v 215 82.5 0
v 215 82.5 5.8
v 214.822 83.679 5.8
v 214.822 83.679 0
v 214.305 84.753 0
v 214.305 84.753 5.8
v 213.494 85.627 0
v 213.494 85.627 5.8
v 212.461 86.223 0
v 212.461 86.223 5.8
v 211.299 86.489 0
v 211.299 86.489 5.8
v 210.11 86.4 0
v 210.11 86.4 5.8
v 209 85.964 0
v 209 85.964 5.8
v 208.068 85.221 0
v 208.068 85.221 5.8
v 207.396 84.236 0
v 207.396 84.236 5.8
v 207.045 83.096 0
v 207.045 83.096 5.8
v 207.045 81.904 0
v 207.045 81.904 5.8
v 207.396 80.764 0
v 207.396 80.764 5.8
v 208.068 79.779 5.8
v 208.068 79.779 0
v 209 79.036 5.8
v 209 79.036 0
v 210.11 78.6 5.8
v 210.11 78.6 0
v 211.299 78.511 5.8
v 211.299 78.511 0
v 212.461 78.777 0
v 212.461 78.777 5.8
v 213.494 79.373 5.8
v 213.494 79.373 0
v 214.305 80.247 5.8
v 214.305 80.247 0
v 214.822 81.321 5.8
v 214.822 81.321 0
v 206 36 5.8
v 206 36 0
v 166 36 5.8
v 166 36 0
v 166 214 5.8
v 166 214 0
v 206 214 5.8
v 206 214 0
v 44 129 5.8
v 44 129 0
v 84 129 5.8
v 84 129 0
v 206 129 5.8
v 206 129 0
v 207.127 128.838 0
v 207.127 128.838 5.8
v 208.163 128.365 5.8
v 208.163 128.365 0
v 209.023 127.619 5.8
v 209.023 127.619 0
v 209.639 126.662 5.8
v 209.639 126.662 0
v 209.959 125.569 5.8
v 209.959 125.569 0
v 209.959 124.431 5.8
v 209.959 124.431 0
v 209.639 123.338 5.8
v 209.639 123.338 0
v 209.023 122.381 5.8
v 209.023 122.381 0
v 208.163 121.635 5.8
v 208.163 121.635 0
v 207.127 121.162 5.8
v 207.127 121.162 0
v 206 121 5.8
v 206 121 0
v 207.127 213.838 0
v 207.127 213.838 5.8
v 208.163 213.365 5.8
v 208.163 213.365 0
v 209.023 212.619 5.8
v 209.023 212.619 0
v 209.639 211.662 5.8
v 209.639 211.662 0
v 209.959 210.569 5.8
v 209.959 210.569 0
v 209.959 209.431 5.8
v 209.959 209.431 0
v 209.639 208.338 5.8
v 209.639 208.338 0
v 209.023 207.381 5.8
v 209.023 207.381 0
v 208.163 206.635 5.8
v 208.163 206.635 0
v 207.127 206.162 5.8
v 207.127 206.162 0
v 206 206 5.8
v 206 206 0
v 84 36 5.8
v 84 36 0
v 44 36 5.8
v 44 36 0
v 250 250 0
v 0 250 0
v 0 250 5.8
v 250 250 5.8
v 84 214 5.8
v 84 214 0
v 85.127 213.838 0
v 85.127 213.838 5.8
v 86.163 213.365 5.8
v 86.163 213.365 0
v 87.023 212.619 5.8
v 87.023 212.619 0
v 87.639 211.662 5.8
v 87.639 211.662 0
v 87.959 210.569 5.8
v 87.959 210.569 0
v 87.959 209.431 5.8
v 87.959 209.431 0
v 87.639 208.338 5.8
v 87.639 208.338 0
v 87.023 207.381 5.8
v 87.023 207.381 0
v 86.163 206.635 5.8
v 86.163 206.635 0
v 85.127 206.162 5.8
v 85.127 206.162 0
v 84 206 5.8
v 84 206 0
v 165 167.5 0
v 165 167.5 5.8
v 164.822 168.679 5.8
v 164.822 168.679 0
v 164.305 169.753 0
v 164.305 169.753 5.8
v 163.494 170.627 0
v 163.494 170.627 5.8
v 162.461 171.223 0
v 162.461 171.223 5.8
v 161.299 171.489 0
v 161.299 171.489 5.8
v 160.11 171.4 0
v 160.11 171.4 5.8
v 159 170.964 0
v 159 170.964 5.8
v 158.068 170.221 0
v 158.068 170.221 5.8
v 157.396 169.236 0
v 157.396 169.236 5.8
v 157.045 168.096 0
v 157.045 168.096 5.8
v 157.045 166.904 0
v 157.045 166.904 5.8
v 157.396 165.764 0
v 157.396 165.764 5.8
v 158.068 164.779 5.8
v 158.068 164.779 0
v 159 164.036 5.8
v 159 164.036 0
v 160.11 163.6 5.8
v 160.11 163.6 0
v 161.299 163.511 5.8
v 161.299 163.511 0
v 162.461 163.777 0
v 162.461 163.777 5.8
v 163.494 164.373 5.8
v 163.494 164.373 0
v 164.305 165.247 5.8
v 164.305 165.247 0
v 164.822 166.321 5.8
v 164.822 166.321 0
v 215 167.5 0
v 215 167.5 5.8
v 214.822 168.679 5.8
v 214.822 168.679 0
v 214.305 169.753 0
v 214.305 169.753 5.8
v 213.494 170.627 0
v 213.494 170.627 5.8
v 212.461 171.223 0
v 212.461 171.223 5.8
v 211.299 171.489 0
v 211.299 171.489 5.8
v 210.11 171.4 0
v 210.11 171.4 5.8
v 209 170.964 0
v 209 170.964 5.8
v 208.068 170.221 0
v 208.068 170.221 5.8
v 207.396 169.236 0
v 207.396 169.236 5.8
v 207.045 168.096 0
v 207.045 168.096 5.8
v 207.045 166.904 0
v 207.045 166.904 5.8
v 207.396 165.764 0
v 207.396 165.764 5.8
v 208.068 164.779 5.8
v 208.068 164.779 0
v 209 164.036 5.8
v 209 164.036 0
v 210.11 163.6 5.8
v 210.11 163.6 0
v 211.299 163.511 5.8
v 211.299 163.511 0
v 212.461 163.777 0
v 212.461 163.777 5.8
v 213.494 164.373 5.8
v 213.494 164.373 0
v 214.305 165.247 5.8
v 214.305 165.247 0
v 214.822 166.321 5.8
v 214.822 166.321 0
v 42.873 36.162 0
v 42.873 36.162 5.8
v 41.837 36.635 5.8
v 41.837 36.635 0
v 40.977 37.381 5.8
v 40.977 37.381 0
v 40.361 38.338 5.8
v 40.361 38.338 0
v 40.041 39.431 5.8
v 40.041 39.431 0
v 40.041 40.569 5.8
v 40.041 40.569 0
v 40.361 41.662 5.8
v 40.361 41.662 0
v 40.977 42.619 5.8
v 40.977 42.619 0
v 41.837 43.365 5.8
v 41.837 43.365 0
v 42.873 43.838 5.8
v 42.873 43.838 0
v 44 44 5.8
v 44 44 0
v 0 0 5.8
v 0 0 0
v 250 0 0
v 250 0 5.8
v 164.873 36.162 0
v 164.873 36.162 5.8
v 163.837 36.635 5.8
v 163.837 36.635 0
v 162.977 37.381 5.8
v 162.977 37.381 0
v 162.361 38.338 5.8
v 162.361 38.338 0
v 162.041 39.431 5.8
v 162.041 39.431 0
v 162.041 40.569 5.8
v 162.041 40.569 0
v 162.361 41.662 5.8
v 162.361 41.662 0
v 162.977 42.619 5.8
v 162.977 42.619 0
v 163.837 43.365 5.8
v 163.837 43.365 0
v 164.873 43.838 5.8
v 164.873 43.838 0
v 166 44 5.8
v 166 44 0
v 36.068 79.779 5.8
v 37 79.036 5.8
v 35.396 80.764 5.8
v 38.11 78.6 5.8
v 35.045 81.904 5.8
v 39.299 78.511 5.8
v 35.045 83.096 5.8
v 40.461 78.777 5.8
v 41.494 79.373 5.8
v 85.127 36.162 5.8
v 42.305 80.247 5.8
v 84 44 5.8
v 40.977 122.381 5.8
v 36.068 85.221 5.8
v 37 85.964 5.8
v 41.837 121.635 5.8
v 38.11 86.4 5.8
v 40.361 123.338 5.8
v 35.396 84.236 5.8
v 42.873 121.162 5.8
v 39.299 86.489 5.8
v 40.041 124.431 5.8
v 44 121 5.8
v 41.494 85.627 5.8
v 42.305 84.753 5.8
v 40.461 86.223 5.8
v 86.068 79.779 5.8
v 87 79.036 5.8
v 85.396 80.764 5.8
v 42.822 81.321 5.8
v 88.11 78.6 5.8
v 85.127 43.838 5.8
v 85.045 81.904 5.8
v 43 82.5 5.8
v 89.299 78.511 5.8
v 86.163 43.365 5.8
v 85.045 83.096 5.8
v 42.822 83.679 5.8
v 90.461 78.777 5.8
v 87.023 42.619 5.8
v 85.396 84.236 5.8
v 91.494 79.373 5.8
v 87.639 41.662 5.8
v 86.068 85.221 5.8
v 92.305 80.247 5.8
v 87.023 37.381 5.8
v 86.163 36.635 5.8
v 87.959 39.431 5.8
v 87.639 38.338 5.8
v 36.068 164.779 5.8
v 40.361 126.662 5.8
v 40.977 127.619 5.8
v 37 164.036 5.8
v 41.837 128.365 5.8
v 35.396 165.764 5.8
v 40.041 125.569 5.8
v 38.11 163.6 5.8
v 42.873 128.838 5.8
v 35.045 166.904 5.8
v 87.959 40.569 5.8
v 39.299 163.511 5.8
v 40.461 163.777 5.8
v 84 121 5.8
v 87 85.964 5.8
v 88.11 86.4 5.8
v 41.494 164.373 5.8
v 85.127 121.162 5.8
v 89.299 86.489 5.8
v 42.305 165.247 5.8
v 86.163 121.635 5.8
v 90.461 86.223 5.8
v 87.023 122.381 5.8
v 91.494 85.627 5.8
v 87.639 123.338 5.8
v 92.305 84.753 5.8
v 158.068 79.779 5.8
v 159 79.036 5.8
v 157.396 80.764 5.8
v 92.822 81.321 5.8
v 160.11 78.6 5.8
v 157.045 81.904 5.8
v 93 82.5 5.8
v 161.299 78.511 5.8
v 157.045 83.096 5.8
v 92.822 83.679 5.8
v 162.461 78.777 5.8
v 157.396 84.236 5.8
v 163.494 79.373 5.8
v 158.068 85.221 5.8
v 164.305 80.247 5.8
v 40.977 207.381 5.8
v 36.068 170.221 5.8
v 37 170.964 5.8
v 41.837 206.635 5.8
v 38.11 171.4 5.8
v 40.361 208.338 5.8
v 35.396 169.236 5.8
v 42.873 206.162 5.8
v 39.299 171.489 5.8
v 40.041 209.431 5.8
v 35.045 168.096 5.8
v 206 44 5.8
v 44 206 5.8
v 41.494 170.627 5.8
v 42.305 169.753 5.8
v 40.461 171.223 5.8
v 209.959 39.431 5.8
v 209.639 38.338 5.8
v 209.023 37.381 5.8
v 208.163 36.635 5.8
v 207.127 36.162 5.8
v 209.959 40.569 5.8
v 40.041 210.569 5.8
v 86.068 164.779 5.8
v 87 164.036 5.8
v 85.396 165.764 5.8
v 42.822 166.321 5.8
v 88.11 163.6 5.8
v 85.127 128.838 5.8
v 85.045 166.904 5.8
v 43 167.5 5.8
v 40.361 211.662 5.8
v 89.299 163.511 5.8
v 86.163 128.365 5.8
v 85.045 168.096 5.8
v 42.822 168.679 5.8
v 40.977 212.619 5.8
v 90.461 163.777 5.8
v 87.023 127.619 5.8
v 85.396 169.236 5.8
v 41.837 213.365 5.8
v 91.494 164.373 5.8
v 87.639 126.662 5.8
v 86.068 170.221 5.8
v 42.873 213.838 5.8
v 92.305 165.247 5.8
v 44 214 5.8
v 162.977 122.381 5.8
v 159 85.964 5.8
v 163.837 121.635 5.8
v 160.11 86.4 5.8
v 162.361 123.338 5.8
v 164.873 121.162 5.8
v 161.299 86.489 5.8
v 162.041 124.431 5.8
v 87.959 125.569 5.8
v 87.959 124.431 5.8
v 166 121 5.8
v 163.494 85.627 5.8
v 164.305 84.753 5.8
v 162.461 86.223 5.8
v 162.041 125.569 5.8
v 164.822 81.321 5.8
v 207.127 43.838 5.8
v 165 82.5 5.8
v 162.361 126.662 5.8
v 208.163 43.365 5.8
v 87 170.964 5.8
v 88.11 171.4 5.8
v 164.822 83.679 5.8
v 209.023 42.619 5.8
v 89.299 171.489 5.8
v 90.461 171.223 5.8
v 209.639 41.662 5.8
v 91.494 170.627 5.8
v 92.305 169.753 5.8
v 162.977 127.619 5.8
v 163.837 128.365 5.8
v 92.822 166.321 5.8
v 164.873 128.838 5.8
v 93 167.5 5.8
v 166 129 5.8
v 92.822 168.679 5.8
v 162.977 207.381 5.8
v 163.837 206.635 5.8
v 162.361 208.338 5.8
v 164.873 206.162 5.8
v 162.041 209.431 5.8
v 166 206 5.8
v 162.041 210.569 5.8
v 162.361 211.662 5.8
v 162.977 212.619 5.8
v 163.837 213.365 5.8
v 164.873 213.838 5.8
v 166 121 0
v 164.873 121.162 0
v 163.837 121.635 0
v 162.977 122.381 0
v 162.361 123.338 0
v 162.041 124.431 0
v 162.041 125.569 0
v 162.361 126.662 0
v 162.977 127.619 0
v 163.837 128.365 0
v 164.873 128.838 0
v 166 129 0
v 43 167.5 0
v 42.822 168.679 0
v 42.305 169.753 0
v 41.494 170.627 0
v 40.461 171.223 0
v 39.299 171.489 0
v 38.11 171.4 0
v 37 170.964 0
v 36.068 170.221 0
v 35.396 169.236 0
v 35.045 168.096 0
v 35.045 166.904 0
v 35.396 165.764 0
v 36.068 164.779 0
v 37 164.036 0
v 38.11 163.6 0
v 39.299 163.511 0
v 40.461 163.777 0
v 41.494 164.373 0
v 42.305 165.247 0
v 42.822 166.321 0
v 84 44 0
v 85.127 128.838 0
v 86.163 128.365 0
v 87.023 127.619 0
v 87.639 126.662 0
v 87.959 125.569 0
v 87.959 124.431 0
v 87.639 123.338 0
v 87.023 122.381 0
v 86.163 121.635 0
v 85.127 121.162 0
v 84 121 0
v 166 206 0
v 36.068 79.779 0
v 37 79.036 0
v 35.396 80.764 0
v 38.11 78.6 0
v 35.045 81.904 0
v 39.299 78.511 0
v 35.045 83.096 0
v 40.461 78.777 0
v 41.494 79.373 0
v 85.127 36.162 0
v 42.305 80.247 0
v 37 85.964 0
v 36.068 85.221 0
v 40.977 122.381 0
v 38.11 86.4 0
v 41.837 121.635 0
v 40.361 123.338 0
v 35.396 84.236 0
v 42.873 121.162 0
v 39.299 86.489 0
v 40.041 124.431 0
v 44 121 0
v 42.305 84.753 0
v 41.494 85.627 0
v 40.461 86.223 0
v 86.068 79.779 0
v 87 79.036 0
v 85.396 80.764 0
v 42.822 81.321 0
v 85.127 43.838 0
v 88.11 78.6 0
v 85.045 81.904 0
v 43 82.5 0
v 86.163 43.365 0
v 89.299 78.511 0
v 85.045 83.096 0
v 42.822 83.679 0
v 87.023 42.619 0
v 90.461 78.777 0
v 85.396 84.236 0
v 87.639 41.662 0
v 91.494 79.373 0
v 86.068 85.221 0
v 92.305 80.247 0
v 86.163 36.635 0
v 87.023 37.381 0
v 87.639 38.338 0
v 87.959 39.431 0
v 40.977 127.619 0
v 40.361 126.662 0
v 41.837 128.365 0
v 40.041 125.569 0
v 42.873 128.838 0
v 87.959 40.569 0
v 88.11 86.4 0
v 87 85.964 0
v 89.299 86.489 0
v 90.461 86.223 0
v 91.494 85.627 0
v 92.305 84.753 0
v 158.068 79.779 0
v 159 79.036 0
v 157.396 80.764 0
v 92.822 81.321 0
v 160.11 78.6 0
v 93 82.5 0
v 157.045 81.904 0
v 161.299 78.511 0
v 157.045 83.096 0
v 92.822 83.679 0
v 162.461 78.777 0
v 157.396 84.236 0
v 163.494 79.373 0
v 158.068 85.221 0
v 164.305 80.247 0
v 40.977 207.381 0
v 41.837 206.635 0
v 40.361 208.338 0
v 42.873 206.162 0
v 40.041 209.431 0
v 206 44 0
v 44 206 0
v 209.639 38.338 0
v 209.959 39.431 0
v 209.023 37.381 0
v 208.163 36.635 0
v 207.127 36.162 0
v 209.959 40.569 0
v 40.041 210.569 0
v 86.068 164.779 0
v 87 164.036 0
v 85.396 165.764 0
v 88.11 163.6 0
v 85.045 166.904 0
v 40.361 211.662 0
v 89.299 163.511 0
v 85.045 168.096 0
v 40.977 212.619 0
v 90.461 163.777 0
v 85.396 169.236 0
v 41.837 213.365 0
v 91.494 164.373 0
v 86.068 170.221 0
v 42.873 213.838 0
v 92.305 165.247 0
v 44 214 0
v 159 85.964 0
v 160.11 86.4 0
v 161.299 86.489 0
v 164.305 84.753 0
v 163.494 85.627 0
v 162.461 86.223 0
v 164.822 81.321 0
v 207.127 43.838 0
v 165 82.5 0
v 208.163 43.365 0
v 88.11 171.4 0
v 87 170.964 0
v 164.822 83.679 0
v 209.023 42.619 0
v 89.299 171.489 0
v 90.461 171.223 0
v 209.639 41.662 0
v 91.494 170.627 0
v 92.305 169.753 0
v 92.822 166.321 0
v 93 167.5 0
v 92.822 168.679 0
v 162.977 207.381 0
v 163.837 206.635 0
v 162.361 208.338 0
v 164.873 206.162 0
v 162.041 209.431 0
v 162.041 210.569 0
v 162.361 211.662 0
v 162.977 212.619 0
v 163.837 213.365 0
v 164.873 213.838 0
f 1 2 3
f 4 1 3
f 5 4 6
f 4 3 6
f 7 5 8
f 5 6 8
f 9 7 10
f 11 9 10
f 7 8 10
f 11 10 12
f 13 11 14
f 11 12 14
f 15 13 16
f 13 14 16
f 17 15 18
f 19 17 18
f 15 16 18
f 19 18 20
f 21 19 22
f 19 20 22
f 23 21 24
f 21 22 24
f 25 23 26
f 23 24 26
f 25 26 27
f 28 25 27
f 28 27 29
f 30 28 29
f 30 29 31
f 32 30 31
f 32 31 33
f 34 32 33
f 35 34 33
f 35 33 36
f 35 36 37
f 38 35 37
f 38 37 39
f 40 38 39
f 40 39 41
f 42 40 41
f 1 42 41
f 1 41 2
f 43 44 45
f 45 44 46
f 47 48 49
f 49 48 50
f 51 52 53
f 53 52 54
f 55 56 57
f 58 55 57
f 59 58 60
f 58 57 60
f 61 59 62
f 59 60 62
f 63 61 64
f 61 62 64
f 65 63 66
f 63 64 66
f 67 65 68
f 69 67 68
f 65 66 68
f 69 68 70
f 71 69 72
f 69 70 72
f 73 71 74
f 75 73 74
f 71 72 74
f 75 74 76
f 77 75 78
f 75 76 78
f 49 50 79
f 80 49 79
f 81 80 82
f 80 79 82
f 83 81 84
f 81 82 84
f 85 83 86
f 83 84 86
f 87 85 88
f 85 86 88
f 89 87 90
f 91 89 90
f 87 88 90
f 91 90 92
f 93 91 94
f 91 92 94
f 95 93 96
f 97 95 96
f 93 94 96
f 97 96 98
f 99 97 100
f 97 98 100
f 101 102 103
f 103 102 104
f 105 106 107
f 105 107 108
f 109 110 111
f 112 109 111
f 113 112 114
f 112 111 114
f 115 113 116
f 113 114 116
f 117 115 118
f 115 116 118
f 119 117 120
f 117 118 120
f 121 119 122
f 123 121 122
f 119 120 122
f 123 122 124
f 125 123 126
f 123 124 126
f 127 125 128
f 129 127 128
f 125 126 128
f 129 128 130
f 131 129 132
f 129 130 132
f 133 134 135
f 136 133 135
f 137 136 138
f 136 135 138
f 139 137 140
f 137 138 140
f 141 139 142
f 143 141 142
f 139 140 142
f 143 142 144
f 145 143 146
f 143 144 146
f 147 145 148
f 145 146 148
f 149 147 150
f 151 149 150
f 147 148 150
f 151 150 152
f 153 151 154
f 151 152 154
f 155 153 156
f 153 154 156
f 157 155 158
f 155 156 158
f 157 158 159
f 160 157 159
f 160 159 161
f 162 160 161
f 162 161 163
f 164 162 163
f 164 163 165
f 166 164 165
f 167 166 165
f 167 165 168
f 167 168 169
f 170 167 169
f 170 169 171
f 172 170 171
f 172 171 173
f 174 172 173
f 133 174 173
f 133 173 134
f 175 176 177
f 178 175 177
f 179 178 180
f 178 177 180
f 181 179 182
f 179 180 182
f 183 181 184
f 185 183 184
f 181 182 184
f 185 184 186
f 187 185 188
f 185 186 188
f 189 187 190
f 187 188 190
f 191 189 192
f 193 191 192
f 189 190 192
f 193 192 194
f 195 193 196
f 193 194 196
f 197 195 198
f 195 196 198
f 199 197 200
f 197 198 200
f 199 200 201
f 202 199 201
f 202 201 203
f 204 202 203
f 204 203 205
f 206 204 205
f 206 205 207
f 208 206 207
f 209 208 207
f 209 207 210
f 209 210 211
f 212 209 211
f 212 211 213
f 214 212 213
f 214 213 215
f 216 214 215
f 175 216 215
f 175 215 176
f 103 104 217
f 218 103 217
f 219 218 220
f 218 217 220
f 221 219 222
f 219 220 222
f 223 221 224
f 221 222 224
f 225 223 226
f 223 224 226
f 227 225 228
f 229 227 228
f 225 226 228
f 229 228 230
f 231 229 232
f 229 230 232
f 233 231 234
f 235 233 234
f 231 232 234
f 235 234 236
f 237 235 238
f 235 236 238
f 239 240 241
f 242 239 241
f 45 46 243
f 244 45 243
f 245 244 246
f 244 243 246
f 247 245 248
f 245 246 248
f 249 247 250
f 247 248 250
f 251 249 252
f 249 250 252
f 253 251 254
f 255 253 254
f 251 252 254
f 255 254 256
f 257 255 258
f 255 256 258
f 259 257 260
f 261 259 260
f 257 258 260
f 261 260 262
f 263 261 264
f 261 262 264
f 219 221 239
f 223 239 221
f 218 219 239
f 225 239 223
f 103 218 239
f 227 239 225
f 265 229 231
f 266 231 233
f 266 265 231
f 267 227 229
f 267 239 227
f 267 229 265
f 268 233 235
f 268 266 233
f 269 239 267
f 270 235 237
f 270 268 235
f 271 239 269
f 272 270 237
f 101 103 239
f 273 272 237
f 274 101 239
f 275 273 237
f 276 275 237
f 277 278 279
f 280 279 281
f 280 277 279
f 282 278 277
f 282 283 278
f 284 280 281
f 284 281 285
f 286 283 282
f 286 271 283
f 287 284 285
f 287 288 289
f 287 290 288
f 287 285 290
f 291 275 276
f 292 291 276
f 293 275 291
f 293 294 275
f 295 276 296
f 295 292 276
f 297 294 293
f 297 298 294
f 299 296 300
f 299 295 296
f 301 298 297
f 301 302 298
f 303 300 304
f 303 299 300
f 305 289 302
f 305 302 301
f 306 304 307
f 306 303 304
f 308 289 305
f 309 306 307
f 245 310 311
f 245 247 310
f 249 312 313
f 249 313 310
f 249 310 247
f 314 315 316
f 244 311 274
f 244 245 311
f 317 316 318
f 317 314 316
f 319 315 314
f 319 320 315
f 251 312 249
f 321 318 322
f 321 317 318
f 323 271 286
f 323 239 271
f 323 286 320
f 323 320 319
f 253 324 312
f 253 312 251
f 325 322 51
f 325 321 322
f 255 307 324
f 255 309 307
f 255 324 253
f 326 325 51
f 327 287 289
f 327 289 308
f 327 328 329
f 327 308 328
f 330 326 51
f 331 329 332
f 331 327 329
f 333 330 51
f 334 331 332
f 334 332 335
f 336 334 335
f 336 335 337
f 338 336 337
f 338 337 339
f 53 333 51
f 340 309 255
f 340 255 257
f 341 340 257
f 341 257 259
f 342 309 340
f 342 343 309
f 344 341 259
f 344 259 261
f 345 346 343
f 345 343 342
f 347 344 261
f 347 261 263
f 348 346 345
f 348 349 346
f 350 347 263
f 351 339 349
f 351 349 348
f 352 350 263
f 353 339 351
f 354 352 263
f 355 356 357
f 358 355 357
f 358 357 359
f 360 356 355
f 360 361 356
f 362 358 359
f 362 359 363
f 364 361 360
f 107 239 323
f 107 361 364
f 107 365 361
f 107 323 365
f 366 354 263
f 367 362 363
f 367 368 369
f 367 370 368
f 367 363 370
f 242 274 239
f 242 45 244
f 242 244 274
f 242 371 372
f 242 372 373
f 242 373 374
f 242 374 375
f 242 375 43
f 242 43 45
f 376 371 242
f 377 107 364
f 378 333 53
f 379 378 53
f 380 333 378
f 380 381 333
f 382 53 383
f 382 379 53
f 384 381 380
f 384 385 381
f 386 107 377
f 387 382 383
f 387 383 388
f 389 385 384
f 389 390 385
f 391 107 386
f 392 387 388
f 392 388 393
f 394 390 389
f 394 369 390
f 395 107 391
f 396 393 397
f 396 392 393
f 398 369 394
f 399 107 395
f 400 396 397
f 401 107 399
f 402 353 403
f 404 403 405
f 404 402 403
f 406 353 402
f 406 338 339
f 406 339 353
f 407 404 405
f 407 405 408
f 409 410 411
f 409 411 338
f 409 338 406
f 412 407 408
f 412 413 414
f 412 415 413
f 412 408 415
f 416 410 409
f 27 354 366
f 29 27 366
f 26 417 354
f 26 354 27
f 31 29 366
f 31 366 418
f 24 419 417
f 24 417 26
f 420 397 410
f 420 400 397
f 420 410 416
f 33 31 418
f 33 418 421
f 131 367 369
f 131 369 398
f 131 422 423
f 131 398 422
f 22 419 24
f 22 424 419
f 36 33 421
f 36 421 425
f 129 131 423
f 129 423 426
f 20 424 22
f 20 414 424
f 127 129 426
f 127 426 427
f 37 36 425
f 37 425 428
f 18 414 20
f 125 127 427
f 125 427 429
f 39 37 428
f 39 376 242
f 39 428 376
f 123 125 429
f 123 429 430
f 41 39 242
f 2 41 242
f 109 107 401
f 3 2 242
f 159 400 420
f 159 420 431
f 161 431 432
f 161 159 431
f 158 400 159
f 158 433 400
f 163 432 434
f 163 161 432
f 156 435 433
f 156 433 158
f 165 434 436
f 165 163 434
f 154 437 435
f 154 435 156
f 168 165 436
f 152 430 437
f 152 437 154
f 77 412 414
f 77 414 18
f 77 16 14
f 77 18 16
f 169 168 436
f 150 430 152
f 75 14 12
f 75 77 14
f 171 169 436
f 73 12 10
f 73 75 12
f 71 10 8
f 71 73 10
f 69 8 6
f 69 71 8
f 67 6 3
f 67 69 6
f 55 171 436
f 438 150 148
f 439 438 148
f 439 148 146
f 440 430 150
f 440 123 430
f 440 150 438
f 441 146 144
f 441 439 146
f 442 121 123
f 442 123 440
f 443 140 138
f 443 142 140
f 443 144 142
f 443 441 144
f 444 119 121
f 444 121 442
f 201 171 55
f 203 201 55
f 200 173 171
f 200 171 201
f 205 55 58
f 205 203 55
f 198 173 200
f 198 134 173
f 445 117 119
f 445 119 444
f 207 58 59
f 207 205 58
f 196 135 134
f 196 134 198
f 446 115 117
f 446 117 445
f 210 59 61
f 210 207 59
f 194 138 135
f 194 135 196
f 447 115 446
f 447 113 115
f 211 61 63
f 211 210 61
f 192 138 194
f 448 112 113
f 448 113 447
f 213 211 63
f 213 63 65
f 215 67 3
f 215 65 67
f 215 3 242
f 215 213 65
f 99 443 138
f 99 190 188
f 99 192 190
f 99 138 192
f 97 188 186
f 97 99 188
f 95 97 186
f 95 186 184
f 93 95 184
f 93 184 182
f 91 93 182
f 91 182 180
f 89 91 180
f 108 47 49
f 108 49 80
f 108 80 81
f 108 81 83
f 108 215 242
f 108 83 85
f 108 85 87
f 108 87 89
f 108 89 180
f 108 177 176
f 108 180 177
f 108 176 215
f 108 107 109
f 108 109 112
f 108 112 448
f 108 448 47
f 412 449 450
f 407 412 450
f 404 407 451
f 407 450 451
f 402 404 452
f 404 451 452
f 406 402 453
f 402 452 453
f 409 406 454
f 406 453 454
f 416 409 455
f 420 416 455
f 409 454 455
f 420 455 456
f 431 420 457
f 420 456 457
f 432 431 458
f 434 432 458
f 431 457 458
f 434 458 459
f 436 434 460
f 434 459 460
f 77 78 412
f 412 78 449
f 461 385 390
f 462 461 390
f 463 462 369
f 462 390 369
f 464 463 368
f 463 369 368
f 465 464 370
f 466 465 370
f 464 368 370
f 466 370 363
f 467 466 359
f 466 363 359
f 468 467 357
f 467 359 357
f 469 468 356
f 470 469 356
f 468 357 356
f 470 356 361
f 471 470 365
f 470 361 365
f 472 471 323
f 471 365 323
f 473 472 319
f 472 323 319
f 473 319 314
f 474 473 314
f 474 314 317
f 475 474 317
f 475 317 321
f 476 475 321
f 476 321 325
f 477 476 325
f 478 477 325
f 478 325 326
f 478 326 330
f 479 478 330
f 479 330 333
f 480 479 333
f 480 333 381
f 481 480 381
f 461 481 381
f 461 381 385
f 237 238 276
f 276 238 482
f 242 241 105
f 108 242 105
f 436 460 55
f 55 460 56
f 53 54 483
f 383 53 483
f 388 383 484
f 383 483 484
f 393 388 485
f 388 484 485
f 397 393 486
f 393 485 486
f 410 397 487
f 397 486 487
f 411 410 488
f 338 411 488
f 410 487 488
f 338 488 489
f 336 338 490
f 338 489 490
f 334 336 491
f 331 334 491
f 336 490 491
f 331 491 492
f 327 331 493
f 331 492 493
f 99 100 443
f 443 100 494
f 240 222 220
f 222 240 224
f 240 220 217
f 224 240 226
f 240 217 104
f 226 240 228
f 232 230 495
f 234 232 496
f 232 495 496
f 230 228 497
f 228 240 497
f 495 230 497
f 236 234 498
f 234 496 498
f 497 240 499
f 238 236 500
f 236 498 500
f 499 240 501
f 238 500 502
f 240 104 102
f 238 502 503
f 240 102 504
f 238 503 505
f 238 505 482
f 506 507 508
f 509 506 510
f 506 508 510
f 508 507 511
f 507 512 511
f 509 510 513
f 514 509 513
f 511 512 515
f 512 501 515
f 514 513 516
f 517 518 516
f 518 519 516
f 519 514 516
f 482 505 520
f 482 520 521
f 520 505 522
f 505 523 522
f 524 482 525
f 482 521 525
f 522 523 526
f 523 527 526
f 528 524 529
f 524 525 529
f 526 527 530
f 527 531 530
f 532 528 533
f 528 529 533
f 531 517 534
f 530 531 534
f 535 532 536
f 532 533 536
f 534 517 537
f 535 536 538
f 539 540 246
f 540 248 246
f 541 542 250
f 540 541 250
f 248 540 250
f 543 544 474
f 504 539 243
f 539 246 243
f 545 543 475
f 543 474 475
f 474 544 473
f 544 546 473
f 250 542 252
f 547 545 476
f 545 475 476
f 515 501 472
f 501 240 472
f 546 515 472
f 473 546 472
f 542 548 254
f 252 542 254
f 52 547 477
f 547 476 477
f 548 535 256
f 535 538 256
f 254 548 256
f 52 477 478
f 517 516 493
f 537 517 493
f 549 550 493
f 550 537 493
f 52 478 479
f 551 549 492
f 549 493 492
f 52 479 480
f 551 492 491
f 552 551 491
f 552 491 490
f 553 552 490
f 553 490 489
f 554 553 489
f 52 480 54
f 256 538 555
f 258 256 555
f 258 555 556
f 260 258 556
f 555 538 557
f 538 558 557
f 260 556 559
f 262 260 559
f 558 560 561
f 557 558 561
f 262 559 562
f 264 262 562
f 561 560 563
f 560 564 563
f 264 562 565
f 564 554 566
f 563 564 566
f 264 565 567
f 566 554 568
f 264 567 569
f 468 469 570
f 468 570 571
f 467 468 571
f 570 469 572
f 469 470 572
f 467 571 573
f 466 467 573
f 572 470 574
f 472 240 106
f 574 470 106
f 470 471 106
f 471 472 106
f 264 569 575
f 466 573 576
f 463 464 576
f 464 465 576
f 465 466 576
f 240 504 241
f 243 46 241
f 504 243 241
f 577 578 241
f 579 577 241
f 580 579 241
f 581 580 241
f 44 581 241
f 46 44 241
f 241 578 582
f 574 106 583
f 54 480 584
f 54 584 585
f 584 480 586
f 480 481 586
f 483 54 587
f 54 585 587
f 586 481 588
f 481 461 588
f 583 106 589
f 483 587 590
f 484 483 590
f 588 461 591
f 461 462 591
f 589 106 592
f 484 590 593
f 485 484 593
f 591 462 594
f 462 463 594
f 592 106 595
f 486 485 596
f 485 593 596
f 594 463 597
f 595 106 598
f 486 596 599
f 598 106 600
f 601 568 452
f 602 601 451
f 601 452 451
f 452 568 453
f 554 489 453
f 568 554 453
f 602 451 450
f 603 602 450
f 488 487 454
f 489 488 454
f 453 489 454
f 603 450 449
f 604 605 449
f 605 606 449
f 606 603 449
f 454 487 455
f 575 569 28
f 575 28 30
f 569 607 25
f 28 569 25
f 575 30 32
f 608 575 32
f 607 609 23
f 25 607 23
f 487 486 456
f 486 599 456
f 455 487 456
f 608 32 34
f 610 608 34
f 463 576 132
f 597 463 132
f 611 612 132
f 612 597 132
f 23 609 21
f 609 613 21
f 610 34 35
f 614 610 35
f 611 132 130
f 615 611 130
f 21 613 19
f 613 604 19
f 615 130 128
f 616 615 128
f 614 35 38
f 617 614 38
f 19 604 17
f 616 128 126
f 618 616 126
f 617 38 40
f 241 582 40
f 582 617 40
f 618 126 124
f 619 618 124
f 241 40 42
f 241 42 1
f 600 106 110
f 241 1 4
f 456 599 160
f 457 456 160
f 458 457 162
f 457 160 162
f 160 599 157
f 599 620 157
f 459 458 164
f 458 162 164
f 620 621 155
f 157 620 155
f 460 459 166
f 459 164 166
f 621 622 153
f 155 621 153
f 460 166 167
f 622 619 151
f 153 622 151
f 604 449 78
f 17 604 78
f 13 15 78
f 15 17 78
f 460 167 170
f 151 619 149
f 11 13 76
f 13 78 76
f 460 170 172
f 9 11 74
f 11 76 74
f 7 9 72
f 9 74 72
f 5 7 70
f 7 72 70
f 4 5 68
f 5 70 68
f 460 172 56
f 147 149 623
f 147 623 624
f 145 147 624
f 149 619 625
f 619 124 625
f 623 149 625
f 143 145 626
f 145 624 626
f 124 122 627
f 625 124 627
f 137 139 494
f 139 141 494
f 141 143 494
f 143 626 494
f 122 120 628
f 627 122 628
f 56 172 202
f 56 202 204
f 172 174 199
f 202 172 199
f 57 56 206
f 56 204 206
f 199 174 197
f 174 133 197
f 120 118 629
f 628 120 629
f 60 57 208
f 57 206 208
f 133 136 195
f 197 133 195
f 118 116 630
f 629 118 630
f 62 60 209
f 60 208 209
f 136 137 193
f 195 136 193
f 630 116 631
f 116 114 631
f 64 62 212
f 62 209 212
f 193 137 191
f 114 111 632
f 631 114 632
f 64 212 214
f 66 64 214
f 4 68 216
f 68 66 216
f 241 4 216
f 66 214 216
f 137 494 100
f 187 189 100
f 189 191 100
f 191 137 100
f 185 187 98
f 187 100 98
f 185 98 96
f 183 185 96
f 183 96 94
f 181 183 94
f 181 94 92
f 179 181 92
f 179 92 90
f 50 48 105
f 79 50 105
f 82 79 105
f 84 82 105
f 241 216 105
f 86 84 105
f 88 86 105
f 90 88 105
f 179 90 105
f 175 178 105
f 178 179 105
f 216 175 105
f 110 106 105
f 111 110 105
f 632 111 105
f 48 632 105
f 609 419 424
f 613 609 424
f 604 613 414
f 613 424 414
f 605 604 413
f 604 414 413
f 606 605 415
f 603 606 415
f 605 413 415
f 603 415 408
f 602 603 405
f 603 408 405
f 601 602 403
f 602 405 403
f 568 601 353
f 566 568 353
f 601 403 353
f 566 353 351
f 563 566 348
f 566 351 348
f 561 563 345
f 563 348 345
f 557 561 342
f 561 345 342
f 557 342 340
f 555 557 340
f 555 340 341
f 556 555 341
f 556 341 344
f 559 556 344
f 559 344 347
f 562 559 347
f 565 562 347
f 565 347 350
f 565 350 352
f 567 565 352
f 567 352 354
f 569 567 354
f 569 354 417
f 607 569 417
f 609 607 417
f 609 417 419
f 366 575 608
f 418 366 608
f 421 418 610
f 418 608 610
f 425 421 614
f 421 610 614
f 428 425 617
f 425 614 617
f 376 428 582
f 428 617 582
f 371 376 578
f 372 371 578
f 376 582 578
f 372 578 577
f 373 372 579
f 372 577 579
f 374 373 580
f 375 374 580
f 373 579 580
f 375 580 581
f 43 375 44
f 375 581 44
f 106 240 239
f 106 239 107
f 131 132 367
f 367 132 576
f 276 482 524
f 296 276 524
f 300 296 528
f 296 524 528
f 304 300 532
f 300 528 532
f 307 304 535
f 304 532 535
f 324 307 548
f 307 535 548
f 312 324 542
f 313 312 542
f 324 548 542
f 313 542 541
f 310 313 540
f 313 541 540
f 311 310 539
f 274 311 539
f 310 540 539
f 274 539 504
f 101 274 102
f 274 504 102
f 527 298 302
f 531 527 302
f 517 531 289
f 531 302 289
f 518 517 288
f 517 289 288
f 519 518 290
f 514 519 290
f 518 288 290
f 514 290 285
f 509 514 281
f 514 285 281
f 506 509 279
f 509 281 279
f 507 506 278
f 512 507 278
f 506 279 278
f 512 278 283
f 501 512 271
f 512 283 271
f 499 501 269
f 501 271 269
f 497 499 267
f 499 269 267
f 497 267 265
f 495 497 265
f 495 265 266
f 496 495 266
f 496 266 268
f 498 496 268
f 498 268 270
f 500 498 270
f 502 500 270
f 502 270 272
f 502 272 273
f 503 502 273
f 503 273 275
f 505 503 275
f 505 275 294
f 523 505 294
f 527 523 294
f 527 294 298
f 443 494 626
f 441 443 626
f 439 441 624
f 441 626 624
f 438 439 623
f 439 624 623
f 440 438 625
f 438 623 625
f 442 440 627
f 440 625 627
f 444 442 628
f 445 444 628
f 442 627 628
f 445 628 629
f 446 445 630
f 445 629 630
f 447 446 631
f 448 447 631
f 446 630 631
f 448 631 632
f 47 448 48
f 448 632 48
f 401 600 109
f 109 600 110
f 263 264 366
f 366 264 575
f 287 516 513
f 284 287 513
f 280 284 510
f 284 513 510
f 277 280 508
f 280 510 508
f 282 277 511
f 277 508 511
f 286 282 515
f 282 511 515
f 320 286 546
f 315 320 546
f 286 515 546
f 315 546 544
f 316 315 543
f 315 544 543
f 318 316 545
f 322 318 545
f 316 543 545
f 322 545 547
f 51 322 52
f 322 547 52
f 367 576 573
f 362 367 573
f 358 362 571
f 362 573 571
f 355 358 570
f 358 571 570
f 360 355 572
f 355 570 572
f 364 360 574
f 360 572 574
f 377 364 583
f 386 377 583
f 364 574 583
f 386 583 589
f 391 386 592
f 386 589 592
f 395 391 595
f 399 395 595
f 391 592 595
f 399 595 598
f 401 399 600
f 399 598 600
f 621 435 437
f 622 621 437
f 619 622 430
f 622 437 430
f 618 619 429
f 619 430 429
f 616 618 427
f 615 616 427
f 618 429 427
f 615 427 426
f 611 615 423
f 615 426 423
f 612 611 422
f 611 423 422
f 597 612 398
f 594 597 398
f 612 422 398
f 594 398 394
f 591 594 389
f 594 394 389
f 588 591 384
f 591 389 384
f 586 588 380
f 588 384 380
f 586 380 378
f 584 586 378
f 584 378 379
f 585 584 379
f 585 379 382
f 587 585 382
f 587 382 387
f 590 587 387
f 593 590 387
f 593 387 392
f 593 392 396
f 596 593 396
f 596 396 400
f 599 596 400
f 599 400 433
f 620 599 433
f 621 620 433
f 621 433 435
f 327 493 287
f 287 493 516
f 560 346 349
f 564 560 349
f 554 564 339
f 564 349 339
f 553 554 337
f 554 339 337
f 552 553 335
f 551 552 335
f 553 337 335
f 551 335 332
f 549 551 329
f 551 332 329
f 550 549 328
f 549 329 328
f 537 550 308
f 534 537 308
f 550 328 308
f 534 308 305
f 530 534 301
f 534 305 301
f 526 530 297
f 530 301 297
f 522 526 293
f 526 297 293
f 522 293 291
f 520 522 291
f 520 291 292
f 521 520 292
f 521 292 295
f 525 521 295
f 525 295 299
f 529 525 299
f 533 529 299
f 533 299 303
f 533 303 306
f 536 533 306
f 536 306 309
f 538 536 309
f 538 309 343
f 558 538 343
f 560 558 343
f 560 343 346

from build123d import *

# Parameters (mm, degrees)
SKETCH_1_W          = 250
SKETCH_1_H          = 250
EXTRUDE_1_DEPTH     = 5.8
CUT_EXTRUDE_1_REACH = 355.601
SKETCH_2_R          = 4


with BuildPart() as part:
    # Эскиз1 → Бобышка-Вытянуть1 (new body)
    with BuildSketch(Plane.XY):
        with Locations((125, 125)):
            Rectangle(SKETCH_1_W, SKETCH_1_H)
        with BuildLine():
            Line((44, 214), (84, 214))
            ThreePointArc((84, 214), (88, 210), (84, 206))
            Line((84, 206), (44, 206))
            ThreePointArc((44, 206), (40, 210), (44, 214))
        make_face(mode=Mode.SUBTRACT)
        with BuildLine():
            Line((166, 214), (206, 214))
            ThreePointArc((206, 214), (210, 210), (206, 206))
            Line((206, 206), (166, 206))
            ThreePointArc((166, 206), (162, 210), (166, 214))
        make_face(mode=Mode.SUBTRACT)
        with BuildLine():
            Line((166, 129), (206, 129))
            ThreePointArc((206, 129), (210, 125), (206, 121))
            Line((206, 121), (166, 121))
            ThreePointArc((166, 121), (162, 125), (166, 129))
        make_face(mode=Mode.SUBTRACT)
        with BuildLine():
            Line((166, 44), (206, 44))
            ThreePointArc((206, 44), (210, 40), (206, 36))
            Line((206, 36), (166, 36))
            ThreePointArc((166, 36), (162, 40), (166, 44))
        make_face(mode=Mode.SUBTRACT)
        with BuildLine():
            Line((44, 129), (84, 129))
            ThreePointArc((84, 129), (88, 125), (84, 121))
            Line((84, 121), (44, 121))
            ThreePointArc((44, 121), (40, 125), (44, 129))
        make_face(mode=Mode.SUBTRACT)
        with BuildLine():
            Line((44, 44), (84, 44))
            ThreePointArc((84, 44), (88, 40), (84, 36))
            Line((84, 36), (44, 36))
            ThreePointArc((44, 36), (40, 40), (44, 44))
        make_face(mode=Mode.SUBTRACT)
    extrude(amount=EXTRUDE_1_DEPTH)

    # Эскиз2 → Вырез-Вытянуть1 (cut, up to next)
    with BuildSketch(Plane.XY.offset(5.8), mode=Mode.PRIVATE) as cut_extrude_1_sk1:
        with Locations((39, 167.5)):
            Circle(SKETCH_2_R)
    cut_extrude_1_tool1 = extrude(cut_extrude_1_sk1.sketch, amount=-CUT_EXTRUDE_1_REACH, mode=Mode.PRIVATE) & part.part
    # Эскиз2 → Вырез-Вытянуть1 (cut, up to next)
    with BuildSketch(Plane.XY.offset(5.8), mode=Mode.PRIVATE) as cut_extrude_1_sk2:
        with Locations((89, 167.5)):
            Circle(SKETCH_2_R)
    cut_extrude_1_tool2 = extrude(cut_extrude_1_sk2.sketch, amount=-CUT_EXTRUDE_1_REACH, mode=Mode.PRIVATE) & part.part
    # Эскиз2 → Вырез-Вытянуть1 (cut, up to next)
    with BuildSketch(Plane.XY.offset(5.8), mode=Mode.PRIVATE) as cut_extrude_1_sk3:
        with Locations((39, 82.5)):
            Circle(SKETCH_2_R)
    cut_extrude_1_tool3 = extrude(cut_extrude_1_sk3.sketch, amount=-CUT_EXTRUDE_1_REACH, mode=Mode.PRIVATE) & part.part
    # Эскиз2 → Вырез-Вытянуть1 (cut, up to next)
    with BuildSketch(Plane.XY.offset(5.8), mode=Mode.PRIVATE) as cut_extrude_1_sk4:
        with Locations((89, 82.5)):
            Circle(SKETCH_2_R)
    cut_extrude_1_tool4 = extrude(cut_extrude_1_sk4.sketch, amount=-CUT_EXTRUDE_1_REACH, mode=Mode.PRIVATE) & part.part
    # Эскиз2 → Вырез-Вытянуть1 (cut, up to next)
    with BuildSketch(Plane.XY.offset(5.8), mode=Mode.PRIVATE) as cut_extrude_1_sk5:
        with Locations((161, 82.5)):
            Circle(SKETCH_2_R)
    cut_extrude_1_tool5 = extrude(cut_extrude_1_sk5.sketch, amount=-CUT_EXTRUDE_1_REACH, mode=Mode.PRIVATE) & part.part
    # Эскиз2 → Вырез-Вытянуть1 (cut, up to next)
    with BuildSketch(Plane.XY.offset(5.8), mode=Mode.PRIVATE) as cut_extrude_1_sk6:
        with Locations((161, 167.5)):
            Circle(SKETCH_2_R)
    cut_extrude_1_tool6 = extrude(cut_extrude_1_sk6.sketch, amount=-CUT_EXTRUDE_1_REACH, mode=Mode.PRIVATE) & part.part
    # Эскиз2 → Вырез-Вытянуть1 (cut, up to next)
    with BuildSketch(Plane.XY.offset(5.8), mode=Mode.PRIVATE) as cut_extrude_1_sk7:
        with Locations((211, 167.5)):
            Circle(SKETCH_2_R)
    cut_extrude_1_tool7 = extrude(cut_extrude_1_sk7.sketch, amount=-CUT_EXTRUDE_1_REACH, mode=Mode.PRIVATE) & part.part
    # Эскиз2 → Вырез-Вытянуть1 (cut, up to next)
    with BuildSketch(Plane.XY.offset(5.8), mode=Mode.PRIVATE) as cut_extrude_1_sk8:
        with Locations((211, 82.5)):
            Circle(SKETCH_2_R)
    cut_extrude_1_tool8 = extrude(cut_extrude_1_sk8.sketch, amount=-CUT_EXTRUDE_1_REACH, mode=Mode.PRIVATE) & part.part
    add(cut_extrude_1_tool1.solids().sort_by_distance((39, 167.5, 5.8))[0], mode=Mode.SUBTRACT)
    add(cut_extrude_1_tool2.solids().sort_by_distance((89, 167.5, 5.8))[0], mode=Mode.SUBTRACT)
    add(cut_extrude_1_tool3.solids().sort_by_distance((39, 82.5, 5.8))[0], mode=Mode.SUBTRACT)
    add(cut_extrude_1_tool4.solids().sort_by_distance((89, 82.5, 5.8))[0], mode=Mode.SUBTRACT)
    add(cut_extrude_1_tool5.solids().sort_by_distance((161, 82.5, 5.8))[0], mode=Mode.SUBTRACT)
    add(cut_extrude_1_tool6.solids().sort_by_distance((161, 167.5, 5.8))[0], mode=Mode.SUBTRACT)
    add(cut_extrude_1_tool7.solids().sort_by_distance((211, 167.5, 5.8))[0], mode=Mode.SUBTRACT)
    add(cut_extrude_1_tool8.solids().sort_by_distance((211, 82.5, 5.8))[0], mode=Mode.SUBTRACT)


solid = part.part
